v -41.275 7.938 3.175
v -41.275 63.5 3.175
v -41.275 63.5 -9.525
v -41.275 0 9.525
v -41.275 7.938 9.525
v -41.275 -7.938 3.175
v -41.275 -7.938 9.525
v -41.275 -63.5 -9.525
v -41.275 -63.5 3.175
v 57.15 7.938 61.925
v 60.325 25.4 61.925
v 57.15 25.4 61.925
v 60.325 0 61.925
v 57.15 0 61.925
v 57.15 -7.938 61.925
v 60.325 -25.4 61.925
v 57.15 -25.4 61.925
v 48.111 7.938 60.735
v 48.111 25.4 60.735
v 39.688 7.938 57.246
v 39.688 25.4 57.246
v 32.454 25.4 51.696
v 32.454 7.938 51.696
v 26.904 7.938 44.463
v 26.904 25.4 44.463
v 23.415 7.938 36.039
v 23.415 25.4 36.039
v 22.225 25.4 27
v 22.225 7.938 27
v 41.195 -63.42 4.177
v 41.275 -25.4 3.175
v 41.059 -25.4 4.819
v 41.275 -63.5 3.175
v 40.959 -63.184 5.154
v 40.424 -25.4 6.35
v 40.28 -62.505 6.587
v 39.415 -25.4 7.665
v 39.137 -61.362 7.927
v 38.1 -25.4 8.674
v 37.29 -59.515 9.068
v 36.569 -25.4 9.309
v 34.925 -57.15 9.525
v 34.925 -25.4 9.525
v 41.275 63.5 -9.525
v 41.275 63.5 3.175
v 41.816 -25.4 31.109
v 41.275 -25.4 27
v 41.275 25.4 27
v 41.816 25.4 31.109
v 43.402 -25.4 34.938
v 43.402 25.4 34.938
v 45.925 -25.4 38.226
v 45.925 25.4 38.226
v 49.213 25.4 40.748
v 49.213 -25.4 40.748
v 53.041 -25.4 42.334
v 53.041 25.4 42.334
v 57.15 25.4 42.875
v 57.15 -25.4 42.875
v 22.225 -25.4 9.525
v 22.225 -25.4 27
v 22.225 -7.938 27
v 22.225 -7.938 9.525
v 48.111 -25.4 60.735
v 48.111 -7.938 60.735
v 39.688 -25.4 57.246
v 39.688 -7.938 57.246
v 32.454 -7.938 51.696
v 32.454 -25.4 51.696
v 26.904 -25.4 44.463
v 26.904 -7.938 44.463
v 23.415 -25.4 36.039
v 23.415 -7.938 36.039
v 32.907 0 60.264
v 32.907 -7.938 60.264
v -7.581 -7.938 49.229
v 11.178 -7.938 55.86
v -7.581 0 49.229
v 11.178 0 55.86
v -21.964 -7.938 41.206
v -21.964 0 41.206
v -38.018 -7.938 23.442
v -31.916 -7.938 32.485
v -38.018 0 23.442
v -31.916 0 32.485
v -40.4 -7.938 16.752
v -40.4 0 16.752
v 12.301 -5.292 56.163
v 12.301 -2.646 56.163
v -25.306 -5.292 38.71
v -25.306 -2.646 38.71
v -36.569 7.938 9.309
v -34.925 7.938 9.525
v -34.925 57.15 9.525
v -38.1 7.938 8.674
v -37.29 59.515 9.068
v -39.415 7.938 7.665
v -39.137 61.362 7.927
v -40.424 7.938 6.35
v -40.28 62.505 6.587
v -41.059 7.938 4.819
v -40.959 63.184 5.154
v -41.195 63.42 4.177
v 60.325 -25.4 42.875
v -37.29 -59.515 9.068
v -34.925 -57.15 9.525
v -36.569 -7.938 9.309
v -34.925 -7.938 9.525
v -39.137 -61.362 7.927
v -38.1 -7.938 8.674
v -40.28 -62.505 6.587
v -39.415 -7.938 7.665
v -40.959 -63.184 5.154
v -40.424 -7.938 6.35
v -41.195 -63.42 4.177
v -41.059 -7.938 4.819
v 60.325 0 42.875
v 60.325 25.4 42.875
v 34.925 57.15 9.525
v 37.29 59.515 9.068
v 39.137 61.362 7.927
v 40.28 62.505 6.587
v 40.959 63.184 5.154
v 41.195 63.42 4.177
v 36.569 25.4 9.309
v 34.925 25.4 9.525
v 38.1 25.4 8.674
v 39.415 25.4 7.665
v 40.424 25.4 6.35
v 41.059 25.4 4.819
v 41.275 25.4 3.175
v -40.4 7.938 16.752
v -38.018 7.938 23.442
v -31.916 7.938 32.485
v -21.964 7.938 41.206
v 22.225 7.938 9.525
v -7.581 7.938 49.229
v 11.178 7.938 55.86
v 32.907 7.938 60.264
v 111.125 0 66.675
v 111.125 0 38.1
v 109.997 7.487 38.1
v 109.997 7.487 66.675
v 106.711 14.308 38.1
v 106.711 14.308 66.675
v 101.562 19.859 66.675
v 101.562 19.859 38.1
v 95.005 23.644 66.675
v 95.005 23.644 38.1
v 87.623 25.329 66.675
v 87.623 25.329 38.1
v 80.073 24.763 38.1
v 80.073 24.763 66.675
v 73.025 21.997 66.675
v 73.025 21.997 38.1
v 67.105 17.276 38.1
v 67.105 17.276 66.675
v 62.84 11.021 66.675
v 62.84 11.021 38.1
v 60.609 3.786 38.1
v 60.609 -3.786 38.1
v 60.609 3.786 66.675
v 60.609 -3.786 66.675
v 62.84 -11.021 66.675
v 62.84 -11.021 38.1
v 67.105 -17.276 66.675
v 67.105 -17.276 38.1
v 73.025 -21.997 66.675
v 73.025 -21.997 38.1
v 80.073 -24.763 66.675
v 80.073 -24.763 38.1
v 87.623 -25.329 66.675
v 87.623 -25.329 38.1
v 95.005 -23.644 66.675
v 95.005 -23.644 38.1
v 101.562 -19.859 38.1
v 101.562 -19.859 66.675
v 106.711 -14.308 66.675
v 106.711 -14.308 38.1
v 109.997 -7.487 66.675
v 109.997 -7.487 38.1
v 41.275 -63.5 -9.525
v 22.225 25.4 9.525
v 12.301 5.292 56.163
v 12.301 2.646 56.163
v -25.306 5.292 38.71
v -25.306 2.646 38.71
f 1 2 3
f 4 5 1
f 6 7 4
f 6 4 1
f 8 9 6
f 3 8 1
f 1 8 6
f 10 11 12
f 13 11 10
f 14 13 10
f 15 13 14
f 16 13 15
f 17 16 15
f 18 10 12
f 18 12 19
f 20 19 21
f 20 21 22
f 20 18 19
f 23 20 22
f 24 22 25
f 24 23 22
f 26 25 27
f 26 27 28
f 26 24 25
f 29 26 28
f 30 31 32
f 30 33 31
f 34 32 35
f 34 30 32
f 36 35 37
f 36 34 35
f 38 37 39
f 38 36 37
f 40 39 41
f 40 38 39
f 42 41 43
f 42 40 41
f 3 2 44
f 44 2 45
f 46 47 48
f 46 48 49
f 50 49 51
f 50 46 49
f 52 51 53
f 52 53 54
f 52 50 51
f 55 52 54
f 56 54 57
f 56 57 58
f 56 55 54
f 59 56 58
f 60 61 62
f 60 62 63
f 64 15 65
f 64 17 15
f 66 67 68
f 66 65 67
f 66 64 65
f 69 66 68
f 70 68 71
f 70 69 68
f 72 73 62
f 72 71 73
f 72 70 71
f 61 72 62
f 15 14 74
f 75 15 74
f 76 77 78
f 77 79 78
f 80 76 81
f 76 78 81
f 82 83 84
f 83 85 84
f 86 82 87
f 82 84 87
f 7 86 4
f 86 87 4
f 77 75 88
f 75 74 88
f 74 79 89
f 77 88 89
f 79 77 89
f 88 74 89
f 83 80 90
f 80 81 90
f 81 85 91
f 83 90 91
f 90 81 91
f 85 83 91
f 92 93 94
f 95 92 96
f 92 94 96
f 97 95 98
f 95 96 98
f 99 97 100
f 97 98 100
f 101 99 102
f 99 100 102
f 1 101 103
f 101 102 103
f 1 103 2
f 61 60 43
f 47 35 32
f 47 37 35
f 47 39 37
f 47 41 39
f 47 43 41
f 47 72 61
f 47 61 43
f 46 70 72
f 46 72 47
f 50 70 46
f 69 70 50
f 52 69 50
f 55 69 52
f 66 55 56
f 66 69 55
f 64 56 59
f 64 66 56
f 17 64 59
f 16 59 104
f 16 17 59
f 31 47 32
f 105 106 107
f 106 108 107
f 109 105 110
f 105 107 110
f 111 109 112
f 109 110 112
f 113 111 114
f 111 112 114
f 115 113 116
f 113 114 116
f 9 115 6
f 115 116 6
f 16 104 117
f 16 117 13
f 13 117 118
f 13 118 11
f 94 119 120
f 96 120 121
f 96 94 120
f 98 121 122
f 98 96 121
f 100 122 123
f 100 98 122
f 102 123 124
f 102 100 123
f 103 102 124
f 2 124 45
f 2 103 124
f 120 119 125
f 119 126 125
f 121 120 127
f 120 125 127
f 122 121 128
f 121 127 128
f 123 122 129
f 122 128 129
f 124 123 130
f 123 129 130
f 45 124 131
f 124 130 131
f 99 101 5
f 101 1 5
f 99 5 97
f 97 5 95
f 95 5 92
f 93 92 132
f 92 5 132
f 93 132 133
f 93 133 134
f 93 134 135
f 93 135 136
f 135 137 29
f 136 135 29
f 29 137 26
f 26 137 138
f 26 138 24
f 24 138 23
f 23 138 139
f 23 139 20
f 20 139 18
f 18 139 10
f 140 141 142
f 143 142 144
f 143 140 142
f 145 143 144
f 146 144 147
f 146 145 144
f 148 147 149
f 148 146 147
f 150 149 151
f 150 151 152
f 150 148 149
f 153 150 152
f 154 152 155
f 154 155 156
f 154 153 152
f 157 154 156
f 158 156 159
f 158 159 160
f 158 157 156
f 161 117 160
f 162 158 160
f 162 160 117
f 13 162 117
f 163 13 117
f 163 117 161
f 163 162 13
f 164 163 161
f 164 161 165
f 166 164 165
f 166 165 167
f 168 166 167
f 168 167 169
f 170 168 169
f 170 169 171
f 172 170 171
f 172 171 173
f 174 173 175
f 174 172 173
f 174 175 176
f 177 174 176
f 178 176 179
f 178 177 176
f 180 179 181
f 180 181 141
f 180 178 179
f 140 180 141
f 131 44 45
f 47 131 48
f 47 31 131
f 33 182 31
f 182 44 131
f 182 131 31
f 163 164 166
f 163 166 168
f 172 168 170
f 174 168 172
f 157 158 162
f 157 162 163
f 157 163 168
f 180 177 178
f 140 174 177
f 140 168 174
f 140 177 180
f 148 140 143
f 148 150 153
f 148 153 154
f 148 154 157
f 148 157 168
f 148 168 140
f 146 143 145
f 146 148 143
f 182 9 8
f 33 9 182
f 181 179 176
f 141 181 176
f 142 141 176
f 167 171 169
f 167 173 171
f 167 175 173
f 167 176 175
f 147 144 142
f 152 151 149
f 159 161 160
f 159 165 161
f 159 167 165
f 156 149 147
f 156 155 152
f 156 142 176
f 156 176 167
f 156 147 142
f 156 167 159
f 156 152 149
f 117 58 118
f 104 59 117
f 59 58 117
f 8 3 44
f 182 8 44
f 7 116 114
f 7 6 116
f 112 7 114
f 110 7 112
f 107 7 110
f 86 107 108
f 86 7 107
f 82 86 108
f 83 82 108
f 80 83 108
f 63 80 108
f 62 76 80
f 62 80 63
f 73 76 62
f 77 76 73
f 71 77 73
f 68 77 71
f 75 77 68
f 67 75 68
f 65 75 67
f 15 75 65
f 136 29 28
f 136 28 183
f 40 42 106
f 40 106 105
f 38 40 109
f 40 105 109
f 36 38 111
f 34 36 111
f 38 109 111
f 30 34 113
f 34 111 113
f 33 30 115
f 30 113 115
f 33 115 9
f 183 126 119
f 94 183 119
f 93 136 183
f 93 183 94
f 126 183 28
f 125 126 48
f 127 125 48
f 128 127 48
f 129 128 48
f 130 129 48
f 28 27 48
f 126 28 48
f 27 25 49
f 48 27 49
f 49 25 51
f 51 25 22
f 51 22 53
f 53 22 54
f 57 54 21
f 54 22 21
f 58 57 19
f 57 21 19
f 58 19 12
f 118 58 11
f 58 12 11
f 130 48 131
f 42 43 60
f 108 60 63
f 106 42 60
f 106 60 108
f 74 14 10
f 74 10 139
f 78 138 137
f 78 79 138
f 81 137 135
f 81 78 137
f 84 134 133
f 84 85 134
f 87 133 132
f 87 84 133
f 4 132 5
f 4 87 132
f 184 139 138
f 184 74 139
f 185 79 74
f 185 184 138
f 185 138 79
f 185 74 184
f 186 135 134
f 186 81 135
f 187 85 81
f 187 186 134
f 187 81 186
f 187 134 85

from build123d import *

# Parameters (mm, degrees)
F1_DEPTH = 63.5
F2_DEPTH = 25.4
F3_DEPTH = 7.9375
F5_R     = 6.35


with BuildPart() as f1:
    # F0 (on Front) → F1 (new body, symmetric)
    with BuildSketch(Plane.XZ):
        Polygon((-41.275, -9.525), (41.275, -9.525), (41.275, 9.525), (22.225, 9.525), (-41.275, 9.525), align=None)
    extrude(amount=F1_DEPTH, both=True)

    # F0 (on Front) → F2 (join, symmetric)
    with BuildSketch(Plane.XZ):
        with BuildLine():
            Line((22.225, 9.525), (41.275, 9.525))
            Line((41.275, 9.525), (41.275, 27.0002))
            ThreePointArc((41.275, 27.0002), (45.9246798487, 38.2255201513), (57.15, 42.8752))
            Line((57.15, 42.8752), (60.325, 42.8752))
            Line((60.325, 42.8752), (60.325, 61.9252))
            Line((60.325, 61.9252), (57.15, 61.9252))
            ThreePointArc((57.15, 61.9252), (32.4542956671, 51.6959043329), (22.225, 27.0002))
            Line((22.225, 27.0002), (22.225, 9.525))
        make_face()
    extrude(amount=F2_DEPTH, both=True)

    # F0 (on Front) → F3 (join, symmetric)
    with BuildSketch(Plane.XZ):
        with BuildLine():
            add(Edge.make_bspline(
                [(57.15, 61.9252), (13.4781720117, 61.9965195656), (-40.9242771566, 44.5877350867), (-41.275, 9.525)],
                knots=[0, 0, 0, 0, 111.5045361635, 111.5045361635, 111.5045361635, 111.5045361635], degree=3))
            Line((-41.275, 9.525), (22.225, 9.525))
            Line((22.225, 9.525), (22.225, 27.0002))
            ThreePointArc((22.225, 27.0002), (32.4542956671, 51.6959043329), (57.15, 61.9252))
        make_face()
    extrude(amount=F3_DEPTH, both=True)

    # F0 (on Front) → F4 (revolve)
    with BuildSketch(Plane.XZ):
        Polygon((85.725, 66.675), (85.725, 61.9252), (85.725, 42.8752), (85.725, 38.1), (111.125, 38.1), (111.125, 66.675), align=None)
    revolve(axis=Axis((85.725, 0, 52.3875), (0, 0, 1)))

    # F5
    f5_edges = [f1.edges().sort_by_distance(p)[0] for p in [
        (-41.275, -35.71875, 9.525),
        (0, -63.5, 9.525),
        (-41.275, 35.71875, 9.525),
        (0, 63.5, 9.525),
        (41.275, 44.45, 9.525),
        (41.275, -44.45, 9.525),
    ]]
    fillet(f5_edges, radius=F5_R)


solid = f1.part
